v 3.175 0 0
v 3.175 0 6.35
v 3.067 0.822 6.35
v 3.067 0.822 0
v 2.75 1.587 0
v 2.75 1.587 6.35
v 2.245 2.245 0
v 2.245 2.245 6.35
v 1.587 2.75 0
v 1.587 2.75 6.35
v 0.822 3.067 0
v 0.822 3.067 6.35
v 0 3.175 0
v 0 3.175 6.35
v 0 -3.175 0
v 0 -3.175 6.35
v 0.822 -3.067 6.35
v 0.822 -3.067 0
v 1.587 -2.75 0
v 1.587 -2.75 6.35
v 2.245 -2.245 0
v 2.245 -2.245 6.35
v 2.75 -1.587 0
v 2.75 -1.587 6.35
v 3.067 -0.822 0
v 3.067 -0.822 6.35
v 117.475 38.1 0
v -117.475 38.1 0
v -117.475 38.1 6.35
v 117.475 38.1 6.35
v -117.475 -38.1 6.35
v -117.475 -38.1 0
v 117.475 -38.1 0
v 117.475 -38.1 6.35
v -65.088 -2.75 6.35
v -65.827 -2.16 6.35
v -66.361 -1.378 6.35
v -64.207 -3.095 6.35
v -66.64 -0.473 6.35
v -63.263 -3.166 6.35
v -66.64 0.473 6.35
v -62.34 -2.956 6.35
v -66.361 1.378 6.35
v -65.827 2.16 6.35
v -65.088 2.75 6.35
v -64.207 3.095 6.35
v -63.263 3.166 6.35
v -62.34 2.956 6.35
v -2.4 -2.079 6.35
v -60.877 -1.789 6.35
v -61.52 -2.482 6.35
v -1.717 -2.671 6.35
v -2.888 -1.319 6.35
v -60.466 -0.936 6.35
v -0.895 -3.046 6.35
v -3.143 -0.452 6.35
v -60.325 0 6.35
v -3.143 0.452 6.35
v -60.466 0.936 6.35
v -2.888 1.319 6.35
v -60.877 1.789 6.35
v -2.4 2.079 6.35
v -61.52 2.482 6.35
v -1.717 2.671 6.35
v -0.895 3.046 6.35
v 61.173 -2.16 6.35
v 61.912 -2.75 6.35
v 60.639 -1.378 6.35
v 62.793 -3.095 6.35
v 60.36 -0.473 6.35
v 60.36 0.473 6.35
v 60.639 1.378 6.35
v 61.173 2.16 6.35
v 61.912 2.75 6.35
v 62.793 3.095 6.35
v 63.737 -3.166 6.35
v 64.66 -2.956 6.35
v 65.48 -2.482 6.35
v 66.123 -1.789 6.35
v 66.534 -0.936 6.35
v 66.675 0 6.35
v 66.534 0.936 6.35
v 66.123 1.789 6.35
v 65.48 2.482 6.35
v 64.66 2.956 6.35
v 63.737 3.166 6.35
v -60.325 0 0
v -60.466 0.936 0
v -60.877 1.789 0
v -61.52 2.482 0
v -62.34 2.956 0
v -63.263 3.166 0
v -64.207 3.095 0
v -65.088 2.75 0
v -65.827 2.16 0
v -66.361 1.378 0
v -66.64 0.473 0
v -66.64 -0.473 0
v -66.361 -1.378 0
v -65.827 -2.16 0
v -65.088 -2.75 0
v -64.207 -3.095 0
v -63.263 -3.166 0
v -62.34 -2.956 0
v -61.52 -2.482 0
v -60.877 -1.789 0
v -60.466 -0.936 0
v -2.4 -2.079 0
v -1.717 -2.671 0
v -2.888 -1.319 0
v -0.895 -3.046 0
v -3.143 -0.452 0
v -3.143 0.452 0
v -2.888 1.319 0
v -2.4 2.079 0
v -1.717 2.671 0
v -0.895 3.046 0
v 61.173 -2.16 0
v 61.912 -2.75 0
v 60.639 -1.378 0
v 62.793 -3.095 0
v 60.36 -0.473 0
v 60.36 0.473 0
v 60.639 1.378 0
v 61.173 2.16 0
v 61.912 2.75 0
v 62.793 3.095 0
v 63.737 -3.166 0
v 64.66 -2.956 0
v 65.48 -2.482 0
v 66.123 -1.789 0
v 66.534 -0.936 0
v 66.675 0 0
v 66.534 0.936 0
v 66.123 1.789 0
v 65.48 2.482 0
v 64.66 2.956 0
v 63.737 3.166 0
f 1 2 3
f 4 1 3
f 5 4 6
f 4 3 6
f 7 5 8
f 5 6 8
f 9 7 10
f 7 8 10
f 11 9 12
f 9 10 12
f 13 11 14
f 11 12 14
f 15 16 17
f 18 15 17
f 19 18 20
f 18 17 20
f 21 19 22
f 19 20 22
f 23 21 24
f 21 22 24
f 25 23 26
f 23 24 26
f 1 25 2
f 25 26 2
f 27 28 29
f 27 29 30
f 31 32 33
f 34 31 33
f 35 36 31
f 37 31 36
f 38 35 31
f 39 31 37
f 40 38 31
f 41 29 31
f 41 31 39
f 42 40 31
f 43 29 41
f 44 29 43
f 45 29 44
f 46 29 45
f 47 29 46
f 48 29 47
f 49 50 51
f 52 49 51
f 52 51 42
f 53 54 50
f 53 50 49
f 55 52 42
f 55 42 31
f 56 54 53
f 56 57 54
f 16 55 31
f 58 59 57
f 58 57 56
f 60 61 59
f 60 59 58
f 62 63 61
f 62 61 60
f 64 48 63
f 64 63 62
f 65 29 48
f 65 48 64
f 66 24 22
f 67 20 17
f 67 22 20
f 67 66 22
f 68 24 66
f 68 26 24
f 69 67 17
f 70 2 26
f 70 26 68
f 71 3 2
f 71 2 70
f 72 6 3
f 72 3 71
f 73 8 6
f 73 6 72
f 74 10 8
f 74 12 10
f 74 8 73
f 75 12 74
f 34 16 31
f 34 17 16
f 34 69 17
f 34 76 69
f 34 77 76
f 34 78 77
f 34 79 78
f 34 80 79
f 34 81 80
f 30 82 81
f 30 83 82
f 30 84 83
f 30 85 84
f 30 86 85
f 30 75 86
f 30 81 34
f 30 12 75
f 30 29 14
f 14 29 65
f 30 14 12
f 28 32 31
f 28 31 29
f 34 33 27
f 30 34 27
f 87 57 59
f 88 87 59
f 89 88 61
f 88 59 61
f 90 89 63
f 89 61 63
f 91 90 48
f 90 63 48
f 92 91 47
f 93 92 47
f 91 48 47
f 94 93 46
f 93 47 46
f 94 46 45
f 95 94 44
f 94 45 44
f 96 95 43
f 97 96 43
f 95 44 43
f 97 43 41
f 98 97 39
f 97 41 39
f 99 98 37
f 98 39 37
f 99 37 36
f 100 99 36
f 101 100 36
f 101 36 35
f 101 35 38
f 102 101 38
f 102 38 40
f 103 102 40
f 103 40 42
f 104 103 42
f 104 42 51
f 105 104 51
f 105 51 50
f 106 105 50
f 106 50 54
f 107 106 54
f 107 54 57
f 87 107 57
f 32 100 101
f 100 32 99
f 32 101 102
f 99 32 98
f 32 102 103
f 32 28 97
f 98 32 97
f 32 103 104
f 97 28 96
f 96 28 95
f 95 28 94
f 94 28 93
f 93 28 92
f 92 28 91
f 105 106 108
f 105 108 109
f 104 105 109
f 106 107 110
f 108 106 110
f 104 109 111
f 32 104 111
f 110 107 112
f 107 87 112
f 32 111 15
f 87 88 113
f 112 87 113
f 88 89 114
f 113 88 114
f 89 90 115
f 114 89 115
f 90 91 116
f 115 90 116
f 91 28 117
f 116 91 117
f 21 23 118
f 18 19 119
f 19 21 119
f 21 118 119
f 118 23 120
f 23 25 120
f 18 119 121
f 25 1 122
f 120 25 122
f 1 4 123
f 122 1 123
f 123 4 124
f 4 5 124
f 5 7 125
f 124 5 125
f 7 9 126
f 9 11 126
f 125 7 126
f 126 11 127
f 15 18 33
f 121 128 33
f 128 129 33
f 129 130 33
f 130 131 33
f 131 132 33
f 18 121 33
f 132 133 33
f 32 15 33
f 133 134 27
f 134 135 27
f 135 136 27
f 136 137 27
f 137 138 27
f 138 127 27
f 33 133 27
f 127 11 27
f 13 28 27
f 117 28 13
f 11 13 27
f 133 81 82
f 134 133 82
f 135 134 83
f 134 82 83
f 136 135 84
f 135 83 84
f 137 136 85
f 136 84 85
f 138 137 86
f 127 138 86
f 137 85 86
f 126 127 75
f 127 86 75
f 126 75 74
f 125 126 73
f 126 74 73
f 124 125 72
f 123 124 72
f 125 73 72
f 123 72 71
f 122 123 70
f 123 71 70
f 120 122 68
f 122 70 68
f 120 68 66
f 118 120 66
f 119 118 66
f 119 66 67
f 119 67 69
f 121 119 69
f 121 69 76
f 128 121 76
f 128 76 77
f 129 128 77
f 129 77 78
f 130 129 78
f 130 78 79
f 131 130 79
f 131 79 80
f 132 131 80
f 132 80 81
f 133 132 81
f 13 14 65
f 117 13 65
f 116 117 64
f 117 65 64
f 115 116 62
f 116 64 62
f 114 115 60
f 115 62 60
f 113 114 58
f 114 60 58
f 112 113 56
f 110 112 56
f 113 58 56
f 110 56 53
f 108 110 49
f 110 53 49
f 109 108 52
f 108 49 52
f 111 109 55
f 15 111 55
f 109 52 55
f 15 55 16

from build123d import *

# Parameters (mm, degrees)
CROQUIS1_W              = 234.95
CROQUIS1_H              = 76.2
SALIENTE_EXTRUIR1_DEPTH = 6.35
CROQUIS2_R              = 3.175
CORTAR_EXTRUIR1_DEPTH   = 7.35


with BuildPart() as part:
    # Croquis1 → Saliente-Extruir1 (new body)
    with BuildSketch(Plane.XY):
        Rectangle(CROQUIS1_W, CROQUIS1_H)
    extrude(amount=SALIENTE_EXTRUIR1_DEPTH)

    # Croquis2 → Cortar-Extruir1 (cut, through all)
    with BuildSketch(Plane.XY.offset(6.35)):
        with BuildLine():
            ThreePointArc((3.175, 0), (2.24506403, 2.24506403), (0, 3.175))
            Line((0, 3.175), (0, -3.175))
            ThreePointArc((0, -3.175), (2.24506403, -2.24506403), (3.175, 0))
        make_face()
        with BuildLine():
            Line((0, -3.175), (0, 3.175))
            ThreePointArc((0, 3.175), (-3.175, 0), (0, -3.175))
        make_face()
        with Locations((-63.5, 0)):
            Circle(CROQUIS2_R)
        with Locations((63.5, 0)):
            Circle(CROQUIS2_R)
    extrude(amount=-CORTAR_EXTRUIR1_DEPTH, mode=Mode.SUBTRACT)


solid = part.part
